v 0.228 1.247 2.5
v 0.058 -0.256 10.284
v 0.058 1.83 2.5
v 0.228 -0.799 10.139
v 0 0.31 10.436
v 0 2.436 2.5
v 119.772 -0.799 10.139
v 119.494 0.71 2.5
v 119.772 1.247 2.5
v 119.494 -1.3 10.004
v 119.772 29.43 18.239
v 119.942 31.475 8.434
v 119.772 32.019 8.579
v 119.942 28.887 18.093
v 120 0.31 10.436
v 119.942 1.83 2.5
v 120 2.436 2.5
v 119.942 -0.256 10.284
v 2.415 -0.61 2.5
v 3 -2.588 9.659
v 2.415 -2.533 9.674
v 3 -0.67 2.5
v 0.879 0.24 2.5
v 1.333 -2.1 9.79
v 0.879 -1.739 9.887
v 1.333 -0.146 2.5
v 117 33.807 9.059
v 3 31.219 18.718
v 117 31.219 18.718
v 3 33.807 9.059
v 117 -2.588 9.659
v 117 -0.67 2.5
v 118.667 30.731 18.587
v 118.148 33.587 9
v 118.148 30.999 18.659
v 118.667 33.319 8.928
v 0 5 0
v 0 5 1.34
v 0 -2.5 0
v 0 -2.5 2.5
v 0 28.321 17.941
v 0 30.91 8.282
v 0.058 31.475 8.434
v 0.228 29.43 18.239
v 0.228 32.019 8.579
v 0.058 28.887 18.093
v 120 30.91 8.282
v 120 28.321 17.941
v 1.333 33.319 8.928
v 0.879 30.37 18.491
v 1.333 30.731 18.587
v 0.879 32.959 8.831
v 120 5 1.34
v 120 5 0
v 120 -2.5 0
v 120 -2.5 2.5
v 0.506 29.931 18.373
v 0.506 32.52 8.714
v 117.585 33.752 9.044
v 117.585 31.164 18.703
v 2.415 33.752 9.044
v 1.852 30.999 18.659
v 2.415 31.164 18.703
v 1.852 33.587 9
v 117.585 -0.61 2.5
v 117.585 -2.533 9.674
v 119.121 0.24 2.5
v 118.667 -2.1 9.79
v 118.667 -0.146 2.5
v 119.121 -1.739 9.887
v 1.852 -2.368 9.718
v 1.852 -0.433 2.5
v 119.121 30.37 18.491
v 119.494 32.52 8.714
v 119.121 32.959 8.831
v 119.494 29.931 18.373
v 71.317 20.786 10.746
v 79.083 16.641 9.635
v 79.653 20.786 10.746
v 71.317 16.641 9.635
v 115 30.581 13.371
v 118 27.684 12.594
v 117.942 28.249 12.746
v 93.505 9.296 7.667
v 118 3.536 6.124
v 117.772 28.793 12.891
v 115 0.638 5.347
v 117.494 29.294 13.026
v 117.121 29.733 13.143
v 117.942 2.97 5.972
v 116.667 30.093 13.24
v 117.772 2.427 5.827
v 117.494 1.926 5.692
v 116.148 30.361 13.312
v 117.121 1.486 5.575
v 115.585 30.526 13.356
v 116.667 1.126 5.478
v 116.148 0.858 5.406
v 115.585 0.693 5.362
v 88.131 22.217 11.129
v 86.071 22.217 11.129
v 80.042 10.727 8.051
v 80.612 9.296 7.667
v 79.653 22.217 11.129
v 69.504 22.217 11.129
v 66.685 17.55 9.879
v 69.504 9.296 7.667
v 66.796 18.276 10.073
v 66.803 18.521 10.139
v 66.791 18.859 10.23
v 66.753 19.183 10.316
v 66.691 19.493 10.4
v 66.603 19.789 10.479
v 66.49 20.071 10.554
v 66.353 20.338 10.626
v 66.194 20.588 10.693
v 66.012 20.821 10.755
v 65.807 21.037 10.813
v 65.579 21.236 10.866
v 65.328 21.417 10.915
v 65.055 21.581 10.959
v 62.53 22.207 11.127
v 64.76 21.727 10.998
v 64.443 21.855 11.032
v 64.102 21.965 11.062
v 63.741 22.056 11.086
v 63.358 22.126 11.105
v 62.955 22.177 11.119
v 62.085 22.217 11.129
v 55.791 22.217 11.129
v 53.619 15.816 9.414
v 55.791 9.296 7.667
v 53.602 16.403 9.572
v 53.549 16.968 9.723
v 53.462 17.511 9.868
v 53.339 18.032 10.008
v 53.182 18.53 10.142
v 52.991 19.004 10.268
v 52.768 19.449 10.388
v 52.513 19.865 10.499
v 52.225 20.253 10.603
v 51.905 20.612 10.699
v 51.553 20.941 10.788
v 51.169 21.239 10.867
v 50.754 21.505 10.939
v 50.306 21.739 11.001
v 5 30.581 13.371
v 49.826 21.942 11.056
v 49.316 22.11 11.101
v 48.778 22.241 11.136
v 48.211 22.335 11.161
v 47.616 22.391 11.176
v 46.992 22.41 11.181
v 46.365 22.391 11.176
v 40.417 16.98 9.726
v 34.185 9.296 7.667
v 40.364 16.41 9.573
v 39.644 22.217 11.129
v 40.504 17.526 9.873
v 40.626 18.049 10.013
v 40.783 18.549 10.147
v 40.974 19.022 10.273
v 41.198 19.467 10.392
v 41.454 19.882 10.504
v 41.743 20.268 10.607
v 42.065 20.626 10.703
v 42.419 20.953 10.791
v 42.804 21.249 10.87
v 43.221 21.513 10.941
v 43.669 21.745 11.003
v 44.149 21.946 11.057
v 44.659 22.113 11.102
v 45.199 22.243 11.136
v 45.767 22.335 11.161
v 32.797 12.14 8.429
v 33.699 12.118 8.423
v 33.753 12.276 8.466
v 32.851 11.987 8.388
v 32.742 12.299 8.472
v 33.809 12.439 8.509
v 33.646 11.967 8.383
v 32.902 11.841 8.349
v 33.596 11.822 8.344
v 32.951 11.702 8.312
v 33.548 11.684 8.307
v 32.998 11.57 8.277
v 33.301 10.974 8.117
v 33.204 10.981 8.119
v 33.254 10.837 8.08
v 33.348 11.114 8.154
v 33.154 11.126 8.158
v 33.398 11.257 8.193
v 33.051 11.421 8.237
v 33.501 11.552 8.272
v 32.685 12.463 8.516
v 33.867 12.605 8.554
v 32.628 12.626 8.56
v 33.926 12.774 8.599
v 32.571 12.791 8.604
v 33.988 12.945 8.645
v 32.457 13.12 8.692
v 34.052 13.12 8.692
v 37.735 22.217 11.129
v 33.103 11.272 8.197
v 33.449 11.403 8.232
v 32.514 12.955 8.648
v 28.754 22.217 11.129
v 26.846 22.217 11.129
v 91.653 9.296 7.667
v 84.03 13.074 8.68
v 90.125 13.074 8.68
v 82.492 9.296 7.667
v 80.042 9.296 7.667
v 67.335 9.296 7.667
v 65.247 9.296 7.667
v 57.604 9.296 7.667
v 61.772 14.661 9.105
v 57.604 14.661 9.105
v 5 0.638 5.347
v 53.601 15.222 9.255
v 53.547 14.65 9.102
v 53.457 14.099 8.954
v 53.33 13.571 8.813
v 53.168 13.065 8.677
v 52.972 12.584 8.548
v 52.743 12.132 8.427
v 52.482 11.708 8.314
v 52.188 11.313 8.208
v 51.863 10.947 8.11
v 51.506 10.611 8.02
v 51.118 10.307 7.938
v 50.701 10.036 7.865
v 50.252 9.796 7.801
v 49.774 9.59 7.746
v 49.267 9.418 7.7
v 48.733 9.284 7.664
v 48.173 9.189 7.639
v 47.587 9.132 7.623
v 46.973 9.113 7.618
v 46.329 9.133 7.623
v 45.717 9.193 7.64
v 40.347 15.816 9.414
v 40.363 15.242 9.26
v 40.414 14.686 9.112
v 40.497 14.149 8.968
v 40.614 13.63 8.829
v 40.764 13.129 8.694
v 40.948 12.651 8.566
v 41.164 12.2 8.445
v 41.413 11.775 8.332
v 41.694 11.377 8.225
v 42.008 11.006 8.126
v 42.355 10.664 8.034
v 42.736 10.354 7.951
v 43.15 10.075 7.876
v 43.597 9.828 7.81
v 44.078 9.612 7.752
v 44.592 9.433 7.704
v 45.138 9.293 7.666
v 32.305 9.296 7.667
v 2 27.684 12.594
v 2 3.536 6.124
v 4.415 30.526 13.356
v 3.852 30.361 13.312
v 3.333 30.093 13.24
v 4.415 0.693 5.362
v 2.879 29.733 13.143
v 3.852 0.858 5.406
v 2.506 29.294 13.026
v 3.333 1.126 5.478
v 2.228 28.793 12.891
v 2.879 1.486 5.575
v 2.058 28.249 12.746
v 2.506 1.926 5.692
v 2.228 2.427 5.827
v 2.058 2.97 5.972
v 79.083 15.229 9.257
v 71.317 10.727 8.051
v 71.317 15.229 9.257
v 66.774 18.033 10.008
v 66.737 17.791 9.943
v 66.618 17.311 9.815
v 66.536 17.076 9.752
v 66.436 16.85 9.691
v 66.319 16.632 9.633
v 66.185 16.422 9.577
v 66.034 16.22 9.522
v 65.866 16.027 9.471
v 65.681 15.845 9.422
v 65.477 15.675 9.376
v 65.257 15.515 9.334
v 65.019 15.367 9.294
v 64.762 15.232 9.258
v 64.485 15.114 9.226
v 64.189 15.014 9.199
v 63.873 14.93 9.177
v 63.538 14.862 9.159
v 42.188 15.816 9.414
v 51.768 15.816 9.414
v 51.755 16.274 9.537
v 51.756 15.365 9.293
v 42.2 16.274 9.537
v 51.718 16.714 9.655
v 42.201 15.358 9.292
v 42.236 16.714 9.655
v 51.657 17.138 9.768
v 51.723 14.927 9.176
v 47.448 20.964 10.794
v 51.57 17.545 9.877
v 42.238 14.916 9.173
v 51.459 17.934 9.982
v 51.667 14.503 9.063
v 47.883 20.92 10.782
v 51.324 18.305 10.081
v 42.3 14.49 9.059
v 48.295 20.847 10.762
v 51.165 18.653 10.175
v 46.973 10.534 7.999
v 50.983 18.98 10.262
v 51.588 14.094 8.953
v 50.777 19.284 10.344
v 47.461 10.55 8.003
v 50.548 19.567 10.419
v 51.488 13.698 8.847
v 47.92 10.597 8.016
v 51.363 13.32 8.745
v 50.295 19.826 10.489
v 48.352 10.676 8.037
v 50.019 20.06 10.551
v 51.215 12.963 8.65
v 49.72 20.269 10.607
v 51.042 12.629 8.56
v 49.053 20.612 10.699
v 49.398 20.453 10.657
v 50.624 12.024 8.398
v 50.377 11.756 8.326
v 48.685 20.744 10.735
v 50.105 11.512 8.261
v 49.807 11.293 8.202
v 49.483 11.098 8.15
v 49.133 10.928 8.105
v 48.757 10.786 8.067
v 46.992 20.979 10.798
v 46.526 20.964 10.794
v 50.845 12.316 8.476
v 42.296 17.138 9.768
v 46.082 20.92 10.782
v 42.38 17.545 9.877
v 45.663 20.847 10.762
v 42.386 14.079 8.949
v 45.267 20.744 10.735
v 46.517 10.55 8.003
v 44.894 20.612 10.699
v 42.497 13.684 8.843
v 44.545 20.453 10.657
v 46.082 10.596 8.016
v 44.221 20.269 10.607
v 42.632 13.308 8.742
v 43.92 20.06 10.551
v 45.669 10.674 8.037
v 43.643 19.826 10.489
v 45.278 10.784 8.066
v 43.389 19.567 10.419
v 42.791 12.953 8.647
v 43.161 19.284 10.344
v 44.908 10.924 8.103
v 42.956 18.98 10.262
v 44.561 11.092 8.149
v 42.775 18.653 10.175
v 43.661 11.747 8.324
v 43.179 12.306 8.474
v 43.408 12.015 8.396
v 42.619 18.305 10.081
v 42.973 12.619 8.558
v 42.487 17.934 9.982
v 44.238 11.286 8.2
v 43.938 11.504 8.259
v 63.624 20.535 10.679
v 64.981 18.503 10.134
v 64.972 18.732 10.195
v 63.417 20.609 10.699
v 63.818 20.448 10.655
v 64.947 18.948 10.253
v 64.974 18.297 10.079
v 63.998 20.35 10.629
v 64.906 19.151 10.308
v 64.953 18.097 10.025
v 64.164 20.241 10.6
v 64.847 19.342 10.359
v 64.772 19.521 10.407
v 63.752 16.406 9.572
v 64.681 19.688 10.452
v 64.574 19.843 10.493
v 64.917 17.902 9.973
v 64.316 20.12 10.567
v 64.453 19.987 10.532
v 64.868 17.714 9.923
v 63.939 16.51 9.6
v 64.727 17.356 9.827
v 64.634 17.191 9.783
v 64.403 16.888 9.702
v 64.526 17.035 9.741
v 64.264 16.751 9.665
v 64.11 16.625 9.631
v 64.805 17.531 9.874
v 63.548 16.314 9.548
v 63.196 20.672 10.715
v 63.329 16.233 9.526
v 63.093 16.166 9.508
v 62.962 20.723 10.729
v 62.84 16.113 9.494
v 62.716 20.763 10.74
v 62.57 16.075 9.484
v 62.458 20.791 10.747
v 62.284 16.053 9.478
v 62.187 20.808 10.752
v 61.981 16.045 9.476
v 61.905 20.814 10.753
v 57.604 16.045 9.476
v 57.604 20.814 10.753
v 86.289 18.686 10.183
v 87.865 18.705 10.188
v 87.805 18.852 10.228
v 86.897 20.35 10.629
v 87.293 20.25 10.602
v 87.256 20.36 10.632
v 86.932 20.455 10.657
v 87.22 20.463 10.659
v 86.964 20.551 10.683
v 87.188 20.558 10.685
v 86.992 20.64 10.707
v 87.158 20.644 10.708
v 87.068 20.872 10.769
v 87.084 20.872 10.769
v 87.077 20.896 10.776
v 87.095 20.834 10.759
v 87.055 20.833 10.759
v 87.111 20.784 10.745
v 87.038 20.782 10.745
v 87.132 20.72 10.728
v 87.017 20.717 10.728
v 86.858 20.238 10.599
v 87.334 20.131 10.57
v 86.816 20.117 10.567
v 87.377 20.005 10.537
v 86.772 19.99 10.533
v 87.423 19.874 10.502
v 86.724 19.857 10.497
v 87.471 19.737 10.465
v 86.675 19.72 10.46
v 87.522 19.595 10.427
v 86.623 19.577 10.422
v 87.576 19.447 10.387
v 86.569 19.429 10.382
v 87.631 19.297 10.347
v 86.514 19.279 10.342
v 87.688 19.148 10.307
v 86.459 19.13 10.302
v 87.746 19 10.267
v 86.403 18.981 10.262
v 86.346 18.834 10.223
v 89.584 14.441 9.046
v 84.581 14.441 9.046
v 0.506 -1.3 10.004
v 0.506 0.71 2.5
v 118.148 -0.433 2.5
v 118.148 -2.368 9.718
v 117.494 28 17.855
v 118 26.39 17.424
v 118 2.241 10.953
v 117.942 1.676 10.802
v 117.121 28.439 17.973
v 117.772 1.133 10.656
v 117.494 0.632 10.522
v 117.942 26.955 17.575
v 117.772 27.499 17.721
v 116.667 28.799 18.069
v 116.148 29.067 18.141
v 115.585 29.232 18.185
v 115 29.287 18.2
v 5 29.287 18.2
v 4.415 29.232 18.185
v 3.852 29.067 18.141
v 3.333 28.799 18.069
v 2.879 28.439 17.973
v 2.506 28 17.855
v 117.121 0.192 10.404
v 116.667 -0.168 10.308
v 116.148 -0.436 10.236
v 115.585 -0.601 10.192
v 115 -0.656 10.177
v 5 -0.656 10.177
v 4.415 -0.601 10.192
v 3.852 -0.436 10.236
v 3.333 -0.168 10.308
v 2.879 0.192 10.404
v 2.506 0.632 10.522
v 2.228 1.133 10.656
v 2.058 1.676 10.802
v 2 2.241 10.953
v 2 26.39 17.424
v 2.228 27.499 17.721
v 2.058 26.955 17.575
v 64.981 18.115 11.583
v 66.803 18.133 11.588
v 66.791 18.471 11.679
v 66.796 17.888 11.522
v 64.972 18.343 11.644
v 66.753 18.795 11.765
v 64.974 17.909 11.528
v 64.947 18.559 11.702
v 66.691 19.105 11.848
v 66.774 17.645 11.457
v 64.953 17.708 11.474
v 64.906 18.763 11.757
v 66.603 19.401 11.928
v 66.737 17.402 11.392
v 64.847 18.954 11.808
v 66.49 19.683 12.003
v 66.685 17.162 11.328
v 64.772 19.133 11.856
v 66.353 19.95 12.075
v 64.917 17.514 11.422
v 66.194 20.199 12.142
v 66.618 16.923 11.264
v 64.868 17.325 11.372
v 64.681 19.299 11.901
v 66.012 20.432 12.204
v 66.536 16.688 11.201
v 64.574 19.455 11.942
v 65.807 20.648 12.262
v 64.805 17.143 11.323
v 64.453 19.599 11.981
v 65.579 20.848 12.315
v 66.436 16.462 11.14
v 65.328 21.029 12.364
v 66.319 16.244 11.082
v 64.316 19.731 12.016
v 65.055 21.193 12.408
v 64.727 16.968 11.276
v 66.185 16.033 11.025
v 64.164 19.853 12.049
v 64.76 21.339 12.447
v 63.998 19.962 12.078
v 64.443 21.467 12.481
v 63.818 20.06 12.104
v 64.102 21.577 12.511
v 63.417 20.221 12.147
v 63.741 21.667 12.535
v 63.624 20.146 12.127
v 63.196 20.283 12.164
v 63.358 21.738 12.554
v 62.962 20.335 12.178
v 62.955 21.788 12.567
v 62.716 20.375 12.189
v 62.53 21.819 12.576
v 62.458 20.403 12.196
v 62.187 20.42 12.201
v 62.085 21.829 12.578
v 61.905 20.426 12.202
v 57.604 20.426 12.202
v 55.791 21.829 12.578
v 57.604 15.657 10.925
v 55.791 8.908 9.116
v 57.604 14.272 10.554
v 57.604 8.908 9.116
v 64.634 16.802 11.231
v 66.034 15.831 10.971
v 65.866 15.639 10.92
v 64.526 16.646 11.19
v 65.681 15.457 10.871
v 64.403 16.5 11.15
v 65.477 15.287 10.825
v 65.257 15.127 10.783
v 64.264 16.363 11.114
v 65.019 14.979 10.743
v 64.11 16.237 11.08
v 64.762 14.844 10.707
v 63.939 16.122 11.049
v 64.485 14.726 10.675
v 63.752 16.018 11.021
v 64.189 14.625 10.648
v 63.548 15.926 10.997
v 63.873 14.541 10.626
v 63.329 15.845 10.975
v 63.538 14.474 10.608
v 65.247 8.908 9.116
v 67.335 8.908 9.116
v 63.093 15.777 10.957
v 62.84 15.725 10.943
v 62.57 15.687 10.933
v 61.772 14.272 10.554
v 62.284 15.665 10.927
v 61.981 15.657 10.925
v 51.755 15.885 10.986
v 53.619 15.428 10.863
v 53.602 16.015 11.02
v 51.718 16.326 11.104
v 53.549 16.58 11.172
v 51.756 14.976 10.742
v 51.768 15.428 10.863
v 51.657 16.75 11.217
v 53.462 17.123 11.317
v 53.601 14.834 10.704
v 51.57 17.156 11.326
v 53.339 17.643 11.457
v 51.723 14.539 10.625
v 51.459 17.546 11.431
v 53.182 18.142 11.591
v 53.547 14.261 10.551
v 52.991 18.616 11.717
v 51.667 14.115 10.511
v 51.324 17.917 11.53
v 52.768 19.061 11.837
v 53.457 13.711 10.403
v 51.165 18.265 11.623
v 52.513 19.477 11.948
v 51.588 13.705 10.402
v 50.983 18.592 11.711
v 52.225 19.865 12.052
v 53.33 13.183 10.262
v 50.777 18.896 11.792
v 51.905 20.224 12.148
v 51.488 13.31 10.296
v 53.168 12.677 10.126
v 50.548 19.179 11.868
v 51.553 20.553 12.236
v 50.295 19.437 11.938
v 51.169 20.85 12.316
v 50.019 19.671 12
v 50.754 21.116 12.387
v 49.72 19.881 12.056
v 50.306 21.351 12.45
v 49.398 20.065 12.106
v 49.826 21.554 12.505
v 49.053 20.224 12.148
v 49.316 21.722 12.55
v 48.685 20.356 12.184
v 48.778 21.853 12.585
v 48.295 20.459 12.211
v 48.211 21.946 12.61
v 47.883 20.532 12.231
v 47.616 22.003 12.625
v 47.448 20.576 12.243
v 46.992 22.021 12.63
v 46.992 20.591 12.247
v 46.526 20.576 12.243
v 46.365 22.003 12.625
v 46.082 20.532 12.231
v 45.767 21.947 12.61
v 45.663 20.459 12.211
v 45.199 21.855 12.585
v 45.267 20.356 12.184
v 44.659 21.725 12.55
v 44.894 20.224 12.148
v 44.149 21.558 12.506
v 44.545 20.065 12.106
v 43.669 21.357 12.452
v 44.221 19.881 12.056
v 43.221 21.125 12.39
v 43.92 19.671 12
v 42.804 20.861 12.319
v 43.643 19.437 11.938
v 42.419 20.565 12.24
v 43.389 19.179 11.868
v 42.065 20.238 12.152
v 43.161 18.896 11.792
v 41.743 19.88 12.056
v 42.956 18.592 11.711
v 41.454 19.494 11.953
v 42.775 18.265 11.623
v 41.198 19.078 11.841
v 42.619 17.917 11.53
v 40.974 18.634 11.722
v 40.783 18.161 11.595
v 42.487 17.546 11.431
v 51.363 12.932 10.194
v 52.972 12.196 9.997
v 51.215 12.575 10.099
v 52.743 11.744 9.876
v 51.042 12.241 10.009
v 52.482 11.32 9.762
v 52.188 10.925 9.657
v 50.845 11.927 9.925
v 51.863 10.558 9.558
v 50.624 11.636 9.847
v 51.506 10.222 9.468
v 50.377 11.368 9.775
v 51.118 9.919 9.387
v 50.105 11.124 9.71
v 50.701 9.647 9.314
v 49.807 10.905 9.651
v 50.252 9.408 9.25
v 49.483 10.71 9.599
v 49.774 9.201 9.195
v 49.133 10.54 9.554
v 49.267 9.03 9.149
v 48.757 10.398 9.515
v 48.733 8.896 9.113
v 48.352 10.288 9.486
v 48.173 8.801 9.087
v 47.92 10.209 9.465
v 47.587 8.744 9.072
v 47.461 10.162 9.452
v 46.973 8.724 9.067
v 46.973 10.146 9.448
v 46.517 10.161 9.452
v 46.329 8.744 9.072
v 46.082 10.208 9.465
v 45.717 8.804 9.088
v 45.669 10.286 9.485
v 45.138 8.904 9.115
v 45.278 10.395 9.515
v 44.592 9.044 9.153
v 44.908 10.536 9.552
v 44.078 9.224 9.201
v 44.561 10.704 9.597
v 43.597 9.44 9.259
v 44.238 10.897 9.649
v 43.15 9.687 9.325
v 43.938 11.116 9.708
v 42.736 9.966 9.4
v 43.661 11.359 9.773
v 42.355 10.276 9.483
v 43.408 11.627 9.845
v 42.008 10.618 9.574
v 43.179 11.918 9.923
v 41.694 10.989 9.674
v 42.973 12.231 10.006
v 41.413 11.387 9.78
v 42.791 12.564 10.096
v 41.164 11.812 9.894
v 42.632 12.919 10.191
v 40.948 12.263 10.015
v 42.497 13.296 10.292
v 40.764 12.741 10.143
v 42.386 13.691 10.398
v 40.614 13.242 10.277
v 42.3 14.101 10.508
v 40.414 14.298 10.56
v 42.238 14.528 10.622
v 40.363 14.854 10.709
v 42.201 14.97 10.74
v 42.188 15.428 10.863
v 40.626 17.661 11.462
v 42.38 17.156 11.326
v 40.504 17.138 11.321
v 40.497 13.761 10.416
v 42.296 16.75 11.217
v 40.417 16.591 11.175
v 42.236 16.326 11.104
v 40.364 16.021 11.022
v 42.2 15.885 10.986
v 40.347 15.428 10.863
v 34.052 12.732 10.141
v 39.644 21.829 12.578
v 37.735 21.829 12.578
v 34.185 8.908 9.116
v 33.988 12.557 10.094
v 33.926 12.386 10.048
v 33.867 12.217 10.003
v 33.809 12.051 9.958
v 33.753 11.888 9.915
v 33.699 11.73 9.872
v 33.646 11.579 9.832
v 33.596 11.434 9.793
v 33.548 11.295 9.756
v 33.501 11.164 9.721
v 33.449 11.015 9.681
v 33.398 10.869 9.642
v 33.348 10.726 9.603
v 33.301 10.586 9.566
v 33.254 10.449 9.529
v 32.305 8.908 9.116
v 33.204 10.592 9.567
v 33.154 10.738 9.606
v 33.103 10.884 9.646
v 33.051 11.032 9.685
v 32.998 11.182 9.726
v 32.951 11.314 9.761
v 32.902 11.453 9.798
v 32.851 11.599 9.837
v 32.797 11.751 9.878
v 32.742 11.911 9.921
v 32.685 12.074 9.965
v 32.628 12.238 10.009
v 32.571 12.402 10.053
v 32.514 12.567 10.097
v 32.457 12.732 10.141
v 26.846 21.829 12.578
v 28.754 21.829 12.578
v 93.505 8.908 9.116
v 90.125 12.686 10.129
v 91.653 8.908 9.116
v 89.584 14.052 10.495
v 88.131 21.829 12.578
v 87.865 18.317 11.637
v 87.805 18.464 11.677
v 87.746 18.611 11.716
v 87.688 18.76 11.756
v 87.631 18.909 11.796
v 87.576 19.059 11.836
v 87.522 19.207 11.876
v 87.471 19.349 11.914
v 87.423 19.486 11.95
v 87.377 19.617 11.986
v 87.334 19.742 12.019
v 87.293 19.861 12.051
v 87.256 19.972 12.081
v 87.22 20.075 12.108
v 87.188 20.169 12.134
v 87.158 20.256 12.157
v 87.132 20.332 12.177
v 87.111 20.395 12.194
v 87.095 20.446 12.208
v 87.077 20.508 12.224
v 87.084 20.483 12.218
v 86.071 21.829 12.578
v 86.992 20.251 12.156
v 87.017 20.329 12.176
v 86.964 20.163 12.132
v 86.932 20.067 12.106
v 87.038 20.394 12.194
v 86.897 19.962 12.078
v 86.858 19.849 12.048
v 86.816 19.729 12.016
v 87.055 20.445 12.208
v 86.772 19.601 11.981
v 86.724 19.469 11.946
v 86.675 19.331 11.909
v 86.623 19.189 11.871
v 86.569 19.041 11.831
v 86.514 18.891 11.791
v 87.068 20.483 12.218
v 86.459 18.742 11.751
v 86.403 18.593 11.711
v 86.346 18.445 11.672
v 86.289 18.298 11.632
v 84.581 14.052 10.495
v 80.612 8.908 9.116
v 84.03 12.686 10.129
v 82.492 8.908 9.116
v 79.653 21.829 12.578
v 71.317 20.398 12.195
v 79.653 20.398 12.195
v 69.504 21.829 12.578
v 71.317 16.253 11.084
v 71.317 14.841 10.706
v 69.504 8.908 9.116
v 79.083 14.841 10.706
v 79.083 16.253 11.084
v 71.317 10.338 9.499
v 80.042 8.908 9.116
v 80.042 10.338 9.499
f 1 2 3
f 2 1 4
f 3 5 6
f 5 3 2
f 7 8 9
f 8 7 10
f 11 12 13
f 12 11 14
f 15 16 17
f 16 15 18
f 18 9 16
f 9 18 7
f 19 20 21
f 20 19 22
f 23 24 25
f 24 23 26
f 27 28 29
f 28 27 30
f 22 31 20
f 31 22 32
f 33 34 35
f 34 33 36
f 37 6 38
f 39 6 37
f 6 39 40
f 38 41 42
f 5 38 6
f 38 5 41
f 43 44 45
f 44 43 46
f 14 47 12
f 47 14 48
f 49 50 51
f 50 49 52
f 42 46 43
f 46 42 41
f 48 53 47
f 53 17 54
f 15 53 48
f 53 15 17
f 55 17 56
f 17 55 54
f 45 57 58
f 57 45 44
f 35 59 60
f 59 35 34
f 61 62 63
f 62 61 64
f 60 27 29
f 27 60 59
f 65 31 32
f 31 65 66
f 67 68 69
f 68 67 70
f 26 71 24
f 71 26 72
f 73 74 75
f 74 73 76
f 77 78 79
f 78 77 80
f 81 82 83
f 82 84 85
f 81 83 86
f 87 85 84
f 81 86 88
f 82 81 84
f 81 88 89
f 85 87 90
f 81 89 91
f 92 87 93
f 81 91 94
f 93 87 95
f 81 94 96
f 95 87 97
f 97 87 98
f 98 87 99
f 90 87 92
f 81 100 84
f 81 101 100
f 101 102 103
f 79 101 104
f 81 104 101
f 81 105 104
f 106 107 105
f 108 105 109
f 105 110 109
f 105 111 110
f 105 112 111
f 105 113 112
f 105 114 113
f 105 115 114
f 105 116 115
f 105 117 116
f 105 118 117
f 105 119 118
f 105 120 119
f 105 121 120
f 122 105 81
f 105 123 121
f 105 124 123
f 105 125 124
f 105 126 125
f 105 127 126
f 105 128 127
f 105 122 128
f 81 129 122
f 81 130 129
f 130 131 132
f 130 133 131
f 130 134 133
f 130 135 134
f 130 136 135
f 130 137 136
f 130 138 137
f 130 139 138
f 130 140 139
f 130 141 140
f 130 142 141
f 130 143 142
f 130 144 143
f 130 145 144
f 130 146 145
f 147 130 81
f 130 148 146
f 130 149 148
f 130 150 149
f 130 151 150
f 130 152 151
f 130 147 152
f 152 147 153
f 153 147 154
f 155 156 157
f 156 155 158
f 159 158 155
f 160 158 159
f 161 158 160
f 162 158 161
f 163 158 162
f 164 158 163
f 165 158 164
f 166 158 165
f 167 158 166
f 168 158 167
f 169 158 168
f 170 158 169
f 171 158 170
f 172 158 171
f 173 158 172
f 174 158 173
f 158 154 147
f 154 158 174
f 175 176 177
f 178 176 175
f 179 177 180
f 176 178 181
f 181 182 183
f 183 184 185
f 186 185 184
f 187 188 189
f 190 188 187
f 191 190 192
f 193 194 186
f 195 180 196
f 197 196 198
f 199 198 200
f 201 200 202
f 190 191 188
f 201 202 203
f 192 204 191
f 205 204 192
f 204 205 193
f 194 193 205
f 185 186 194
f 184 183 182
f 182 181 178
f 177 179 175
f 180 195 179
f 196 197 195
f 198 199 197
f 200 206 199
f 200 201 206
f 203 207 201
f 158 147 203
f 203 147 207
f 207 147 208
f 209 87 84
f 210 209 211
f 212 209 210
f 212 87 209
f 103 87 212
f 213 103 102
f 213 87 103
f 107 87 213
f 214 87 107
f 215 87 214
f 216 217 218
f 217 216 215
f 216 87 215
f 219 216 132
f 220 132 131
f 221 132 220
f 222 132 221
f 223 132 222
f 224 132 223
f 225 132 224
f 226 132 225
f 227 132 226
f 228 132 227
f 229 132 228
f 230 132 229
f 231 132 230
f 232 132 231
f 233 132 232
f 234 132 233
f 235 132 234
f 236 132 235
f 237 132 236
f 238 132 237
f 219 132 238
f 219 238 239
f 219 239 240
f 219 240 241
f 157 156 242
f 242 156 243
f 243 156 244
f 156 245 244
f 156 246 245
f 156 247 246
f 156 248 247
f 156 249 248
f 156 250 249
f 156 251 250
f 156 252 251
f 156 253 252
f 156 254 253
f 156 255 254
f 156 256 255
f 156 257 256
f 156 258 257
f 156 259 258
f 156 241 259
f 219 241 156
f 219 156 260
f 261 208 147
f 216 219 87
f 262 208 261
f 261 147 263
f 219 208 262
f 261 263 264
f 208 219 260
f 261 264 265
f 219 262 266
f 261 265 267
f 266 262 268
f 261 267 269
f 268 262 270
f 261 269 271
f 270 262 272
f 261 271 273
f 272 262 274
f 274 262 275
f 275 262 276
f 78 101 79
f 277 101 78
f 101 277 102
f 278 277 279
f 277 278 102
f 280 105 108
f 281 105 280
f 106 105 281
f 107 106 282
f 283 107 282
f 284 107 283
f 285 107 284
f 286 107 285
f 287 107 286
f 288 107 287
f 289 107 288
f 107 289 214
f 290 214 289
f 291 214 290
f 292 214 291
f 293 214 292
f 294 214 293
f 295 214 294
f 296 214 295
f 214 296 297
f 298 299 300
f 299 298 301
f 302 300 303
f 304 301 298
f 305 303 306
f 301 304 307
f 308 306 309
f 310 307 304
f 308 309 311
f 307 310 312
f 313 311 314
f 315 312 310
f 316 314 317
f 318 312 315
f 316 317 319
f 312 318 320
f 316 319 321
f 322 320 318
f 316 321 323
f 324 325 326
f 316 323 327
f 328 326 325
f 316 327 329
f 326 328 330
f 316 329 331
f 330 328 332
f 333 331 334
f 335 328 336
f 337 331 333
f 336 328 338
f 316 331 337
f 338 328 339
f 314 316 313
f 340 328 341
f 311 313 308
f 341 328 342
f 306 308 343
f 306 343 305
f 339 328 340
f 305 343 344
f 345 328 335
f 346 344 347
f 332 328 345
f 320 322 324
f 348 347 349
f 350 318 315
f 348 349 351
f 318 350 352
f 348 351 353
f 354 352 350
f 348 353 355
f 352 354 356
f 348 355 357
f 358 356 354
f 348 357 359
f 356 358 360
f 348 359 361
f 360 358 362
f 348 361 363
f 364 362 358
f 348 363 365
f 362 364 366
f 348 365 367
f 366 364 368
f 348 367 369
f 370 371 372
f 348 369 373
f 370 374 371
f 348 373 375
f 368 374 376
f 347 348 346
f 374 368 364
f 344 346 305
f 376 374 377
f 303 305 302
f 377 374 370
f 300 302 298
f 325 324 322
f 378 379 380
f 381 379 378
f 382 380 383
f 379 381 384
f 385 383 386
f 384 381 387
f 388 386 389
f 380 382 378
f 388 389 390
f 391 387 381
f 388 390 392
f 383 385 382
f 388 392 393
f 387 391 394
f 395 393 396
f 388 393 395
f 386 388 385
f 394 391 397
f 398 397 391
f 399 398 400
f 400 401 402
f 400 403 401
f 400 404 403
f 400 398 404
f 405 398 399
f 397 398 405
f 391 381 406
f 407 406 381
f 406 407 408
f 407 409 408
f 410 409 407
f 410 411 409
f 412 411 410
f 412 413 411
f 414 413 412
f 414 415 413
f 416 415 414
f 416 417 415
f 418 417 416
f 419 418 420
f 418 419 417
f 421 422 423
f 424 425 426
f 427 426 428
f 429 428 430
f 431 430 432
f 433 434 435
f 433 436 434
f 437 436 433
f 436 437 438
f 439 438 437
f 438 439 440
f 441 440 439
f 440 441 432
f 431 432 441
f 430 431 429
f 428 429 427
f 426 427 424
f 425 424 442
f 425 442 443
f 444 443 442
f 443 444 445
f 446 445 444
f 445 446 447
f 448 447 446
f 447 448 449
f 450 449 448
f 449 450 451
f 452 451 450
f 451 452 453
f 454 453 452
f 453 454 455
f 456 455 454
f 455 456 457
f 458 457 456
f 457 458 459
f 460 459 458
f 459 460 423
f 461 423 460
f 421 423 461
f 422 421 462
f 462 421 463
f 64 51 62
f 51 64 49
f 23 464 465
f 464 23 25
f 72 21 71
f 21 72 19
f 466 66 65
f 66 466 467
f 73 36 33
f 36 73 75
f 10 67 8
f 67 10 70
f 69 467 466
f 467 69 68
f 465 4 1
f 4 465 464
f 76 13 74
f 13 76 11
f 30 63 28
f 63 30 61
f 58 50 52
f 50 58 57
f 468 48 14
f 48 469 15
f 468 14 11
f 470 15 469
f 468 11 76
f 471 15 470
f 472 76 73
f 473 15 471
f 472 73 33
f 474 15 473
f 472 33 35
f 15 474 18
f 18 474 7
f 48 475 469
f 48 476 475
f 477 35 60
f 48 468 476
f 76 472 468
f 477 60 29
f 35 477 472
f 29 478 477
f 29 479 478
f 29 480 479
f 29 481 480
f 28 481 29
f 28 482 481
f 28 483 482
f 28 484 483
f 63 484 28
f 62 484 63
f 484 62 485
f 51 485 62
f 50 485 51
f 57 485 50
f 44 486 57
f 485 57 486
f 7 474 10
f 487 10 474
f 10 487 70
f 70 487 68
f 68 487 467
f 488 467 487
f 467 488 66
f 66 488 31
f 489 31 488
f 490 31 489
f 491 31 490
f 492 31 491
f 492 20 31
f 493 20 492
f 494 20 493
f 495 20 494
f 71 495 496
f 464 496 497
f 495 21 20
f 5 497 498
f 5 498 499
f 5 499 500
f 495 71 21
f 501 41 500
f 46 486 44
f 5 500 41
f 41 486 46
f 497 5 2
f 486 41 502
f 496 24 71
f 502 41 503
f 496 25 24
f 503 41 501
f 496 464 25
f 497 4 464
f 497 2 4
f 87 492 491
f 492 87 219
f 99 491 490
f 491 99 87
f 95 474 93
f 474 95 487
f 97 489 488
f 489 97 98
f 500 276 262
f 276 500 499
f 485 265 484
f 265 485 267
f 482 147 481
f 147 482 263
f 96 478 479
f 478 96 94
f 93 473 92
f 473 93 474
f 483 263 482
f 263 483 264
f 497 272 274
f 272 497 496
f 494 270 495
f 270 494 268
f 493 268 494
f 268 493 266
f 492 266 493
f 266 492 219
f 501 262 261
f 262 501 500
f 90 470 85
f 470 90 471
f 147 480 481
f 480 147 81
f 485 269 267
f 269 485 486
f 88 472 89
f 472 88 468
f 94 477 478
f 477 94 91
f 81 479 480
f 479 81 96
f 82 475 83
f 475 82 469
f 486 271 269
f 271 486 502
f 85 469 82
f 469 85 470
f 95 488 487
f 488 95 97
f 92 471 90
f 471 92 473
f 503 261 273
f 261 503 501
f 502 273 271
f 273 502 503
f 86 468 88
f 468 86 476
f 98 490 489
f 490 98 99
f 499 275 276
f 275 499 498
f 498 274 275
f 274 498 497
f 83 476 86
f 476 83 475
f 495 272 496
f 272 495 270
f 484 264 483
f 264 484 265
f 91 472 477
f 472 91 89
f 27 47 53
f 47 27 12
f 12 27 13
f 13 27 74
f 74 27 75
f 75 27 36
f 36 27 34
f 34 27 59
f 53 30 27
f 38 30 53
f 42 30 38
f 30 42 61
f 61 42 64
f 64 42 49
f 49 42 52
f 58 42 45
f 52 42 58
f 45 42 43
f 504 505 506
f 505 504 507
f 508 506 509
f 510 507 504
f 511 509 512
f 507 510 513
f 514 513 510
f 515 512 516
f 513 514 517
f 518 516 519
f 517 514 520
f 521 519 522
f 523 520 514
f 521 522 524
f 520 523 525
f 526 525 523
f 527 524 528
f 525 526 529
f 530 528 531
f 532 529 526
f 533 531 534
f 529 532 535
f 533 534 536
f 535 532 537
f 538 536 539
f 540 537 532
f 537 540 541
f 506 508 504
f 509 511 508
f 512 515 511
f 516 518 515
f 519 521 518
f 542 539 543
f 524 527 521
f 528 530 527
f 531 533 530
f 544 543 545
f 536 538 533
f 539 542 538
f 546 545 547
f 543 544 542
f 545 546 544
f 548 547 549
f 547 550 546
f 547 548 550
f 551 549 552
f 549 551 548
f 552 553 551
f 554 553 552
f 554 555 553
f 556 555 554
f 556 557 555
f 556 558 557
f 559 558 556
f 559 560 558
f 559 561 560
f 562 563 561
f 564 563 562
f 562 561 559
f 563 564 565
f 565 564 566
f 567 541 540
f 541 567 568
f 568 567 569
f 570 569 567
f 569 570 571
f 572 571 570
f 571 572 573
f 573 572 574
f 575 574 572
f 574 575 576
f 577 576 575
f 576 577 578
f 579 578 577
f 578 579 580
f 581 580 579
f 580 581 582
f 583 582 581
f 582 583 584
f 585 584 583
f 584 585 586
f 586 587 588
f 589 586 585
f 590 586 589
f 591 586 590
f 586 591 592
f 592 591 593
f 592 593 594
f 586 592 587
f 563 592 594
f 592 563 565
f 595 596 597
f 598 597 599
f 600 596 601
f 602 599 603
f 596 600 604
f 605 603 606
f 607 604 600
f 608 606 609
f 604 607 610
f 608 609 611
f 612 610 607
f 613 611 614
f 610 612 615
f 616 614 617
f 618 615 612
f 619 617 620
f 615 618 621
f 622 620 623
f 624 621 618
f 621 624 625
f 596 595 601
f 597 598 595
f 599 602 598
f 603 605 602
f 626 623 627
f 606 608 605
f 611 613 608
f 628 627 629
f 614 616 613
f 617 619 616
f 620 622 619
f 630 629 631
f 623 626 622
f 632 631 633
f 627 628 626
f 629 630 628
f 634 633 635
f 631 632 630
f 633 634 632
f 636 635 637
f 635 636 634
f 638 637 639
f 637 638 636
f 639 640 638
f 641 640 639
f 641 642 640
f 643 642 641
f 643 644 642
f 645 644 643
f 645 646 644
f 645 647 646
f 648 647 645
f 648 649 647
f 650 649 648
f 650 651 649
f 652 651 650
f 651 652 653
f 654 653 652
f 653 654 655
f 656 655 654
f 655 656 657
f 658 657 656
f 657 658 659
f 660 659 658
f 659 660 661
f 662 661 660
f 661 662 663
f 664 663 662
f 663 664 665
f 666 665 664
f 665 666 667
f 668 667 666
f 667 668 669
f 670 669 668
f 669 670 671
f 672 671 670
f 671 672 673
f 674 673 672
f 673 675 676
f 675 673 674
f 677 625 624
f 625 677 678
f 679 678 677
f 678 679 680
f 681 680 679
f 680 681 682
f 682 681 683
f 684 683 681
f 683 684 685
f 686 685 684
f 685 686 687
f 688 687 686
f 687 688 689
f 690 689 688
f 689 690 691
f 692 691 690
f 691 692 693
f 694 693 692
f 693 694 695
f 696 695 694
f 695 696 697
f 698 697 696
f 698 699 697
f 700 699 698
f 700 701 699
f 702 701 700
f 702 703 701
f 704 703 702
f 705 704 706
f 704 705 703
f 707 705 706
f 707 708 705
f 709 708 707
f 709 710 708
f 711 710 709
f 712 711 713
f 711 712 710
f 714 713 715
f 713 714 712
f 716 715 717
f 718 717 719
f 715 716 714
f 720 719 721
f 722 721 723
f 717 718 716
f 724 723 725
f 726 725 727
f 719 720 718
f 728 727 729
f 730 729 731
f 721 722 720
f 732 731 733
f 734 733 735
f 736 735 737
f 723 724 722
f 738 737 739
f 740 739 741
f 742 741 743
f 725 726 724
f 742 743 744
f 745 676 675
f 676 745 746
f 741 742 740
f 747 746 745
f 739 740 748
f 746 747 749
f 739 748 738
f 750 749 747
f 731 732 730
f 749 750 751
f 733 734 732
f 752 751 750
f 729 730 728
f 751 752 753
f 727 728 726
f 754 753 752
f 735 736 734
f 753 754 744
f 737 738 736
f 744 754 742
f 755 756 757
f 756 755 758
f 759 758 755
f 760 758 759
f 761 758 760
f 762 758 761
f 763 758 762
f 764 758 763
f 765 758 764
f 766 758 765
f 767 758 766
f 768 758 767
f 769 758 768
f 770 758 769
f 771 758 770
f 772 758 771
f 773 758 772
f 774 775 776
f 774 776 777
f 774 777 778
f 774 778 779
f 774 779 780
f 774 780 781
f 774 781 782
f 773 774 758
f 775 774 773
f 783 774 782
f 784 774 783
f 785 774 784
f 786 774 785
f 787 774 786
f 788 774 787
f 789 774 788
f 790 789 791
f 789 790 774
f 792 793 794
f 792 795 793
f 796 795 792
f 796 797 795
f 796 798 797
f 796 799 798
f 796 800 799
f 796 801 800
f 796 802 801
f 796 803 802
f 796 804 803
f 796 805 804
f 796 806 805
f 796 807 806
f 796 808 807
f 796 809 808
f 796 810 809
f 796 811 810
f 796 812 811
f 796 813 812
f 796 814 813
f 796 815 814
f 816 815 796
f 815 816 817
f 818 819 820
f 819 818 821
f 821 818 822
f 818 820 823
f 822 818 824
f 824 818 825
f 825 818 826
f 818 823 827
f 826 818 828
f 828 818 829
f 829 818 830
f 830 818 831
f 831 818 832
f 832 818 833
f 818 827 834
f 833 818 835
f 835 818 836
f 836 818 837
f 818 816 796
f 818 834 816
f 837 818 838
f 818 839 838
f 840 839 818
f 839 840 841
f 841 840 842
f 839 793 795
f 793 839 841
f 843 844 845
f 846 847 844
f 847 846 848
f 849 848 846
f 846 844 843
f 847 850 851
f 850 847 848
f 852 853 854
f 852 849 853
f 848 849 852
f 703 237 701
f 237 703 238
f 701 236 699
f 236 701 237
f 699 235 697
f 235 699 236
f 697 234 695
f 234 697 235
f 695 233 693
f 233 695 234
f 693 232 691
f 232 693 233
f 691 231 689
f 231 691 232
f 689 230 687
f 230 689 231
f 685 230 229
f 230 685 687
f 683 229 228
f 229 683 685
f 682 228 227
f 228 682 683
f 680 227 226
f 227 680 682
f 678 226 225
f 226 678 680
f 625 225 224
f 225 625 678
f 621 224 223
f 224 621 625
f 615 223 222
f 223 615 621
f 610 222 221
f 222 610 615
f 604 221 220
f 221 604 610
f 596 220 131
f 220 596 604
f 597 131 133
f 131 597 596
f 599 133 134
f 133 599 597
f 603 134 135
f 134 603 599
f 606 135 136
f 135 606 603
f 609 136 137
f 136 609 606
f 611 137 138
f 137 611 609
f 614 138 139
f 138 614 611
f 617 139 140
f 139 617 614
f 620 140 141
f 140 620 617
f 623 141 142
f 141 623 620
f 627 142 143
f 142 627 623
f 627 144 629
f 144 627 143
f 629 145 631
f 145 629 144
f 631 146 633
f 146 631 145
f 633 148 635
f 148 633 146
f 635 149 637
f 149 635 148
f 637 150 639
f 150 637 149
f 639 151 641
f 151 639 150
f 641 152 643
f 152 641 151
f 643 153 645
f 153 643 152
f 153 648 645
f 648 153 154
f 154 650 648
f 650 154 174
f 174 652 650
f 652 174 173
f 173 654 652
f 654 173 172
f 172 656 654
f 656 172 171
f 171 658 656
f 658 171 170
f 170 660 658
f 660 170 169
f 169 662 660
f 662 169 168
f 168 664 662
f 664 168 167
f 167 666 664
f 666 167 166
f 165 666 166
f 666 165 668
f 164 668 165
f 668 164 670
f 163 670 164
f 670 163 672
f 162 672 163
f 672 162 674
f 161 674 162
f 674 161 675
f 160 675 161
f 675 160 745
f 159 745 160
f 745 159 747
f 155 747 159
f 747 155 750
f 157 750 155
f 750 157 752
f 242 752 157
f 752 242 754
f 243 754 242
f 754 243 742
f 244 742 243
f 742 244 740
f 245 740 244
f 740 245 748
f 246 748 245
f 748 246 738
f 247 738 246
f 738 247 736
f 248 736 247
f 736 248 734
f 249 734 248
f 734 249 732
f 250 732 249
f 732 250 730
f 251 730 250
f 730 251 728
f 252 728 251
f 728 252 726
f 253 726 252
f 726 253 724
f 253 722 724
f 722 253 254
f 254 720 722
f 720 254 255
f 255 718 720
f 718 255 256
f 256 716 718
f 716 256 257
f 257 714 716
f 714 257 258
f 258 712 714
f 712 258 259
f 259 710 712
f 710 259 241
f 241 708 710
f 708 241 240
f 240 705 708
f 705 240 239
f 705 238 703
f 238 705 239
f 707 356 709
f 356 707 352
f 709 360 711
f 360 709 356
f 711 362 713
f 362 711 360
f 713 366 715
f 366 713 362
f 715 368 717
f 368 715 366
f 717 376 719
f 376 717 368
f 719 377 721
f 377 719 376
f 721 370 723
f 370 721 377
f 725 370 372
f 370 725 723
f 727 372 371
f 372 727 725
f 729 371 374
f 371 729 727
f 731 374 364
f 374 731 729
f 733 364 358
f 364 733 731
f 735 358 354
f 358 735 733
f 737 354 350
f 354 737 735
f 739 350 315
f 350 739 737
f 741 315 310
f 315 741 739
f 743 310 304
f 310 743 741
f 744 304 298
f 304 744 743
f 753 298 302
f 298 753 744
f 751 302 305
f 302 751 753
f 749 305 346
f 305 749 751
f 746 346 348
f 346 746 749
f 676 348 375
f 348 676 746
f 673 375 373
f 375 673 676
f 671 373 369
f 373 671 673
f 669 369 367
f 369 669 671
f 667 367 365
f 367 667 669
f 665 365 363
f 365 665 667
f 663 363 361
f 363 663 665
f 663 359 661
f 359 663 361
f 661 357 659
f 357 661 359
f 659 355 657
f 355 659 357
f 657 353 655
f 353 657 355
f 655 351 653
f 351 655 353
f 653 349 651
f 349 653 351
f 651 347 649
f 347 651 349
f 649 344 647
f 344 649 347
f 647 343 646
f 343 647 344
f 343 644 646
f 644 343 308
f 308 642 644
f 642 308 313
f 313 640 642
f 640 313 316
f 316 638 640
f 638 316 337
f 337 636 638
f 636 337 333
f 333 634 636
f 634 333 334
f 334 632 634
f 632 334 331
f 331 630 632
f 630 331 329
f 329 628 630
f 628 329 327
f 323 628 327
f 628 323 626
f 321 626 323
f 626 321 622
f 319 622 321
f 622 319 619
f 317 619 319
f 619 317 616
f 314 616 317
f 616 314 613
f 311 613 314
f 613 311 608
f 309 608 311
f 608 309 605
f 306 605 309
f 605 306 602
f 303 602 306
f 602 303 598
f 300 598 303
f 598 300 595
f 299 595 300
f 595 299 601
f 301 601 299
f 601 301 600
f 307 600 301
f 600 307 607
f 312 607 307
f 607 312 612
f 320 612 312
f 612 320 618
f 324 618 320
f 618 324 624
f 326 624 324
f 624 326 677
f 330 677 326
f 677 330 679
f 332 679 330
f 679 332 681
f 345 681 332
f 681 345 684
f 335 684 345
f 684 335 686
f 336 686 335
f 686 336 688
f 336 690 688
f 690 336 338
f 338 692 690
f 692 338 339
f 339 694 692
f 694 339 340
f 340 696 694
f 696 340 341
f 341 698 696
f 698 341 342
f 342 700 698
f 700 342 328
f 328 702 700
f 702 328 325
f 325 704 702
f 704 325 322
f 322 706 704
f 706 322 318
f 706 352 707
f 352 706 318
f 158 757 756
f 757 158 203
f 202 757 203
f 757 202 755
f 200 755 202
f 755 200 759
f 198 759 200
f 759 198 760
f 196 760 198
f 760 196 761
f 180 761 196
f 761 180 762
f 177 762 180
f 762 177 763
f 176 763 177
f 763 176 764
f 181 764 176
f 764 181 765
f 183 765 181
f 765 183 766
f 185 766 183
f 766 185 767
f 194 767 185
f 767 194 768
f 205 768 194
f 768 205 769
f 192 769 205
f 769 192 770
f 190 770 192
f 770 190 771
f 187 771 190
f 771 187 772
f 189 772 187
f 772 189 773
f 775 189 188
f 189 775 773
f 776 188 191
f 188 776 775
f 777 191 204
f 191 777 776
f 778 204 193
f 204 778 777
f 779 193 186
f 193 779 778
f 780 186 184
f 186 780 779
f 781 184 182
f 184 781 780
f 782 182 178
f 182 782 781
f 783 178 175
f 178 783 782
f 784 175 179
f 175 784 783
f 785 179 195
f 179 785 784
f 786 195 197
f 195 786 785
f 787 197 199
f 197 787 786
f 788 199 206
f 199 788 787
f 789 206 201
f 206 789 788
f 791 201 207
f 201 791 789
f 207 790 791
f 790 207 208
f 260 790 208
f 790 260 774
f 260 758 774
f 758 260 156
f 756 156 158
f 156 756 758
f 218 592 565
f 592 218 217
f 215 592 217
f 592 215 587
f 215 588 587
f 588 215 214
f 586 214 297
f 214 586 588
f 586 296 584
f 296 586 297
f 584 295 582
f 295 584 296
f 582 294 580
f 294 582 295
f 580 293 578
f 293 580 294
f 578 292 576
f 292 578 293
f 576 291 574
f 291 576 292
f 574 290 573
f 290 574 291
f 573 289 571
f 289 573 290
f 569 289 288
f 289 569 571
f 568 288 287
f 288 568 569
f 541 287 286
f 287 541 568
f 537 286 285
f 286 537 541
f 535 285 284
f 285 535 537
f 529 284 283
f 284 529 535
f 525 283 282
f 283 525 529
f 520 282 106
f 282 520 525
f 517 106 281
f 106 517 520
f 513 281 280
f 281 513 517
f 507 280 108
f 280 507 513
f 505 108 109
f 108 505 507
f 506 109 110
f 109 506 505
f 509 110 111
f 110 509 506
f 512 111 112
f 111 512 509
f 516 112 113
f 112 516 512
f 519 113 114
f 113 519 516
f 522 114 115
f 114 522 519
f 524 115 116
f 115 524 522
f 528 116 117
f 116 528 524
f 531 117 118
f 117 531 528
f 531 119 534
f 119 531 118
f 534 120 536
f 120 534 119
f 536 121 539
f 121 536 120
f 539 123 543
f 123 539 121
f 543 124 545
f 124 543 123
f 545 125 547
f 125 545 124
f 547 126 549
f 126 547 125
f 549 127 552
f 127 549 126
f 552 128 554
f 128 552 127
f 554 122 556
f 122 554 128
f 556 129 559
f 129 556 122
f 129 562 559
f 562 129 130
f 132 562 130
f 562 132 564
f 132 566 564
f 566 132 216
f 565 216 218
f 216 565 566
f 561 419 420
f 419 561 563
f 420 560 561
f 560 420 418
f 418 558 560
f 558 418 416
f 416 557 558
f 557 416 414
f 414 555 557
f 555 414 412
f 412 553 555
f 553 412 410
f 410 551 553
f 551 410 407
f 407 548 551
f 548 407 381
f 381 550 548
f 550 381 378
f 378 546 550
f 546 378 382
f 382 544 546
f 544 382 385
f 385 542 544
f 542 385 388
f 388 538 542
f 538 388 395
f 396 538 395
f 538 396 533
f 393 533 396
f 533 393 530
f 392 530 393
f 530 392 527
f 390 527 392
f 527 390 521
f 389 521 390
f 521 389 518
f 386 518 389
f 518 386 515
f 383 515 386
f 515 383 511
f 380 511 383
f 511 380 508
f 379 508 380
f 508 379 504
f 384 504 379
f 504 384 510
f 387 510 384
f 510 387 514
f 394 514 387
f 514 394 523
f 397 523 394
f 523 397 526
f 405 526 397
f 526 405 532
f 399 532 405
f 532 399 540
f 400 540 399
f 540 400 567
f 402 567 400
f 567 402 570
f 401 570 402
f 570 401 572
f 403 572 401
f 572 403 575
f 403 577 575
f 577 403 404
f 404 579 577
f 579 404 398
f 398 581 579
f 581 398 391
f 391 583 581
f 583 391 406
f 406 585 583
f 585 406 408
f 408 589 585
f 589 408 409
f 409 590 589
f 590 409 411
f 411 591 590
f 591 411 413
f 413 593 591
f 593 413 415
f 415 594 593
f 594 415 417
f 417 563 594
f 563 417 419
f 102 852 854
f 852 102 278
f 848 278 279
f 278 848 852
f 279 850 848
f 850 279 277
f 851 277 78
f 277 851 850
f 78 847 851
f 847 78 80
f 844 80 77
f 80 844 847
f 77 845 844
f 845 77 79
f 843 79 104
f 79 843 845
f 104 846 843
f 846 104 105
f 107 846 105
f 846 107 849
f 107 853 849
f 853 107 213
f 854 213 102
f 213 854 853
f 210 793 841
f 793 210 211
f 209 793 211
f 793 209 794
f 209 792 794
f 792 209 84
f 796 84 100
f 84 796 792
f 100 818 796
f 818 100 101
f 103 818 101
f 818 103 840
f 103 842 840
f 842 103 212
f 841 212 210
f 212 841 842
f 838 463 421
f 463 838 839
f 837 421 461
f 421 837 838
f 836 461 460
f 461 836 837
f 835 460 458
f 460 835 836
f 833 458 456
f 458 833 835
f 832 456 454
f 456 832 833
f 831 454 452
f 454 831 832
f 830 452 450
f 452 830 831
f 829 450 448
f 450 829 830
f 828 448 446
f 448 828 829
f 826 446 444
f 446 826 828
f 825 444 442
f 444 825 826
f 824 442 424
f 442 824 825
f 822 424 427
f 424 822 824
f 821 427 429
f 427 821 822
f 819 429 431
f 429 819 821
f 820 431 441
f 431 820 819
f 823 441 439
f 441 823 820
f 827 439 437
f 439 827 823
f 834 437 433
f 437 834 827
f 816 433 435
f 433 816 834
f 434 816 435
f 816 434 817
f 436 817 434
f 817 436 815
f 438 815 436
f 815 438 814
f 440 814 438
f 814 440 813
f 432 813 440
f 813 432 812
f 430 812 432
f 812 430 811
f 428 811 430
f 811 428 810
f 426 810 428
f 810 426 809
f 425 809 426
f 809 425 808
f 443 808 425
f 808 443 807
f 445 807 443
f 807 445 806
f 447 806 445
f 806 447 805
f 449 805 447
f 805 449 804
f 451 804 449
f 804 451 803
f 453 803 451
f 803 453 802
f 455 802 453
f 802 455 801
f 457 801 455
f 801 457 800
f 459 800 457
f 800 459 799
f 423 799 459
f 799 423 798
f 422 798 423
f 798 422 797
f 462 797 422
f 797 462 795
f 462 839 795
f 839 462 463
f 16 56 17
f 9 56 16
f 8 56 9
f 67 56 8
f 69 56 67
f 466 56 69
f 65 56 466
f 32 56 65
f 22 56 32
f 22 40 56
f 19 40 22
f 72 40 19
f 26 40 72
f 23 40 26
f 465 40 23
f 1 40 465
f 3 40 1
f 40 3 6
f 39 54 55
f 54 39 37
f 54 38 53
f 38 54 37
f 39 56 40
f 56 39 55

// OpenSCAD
// Vorea Studio — Parametric Desk Nameplate
// Customizable nameplate with embossed text and decorative border
// Compatible: Vorea Studio SCAD Engine

// [Section: Text]
name_text = "VOREA";       // Text to display
font_size = 14;            // [8:1:30] Tamano de fuente (mm)
text_depth = 1.5;          // [0.5:0.5:4] Profundidad del texto (mm)

// [Section: Plate]
plate_width = 120;   // [60:5:200] Ancho de la placa (mm)
plate_height = 35;   // [20:5:60] Alto de la placa (mm)
plate_depth = 5;     // [3:1:10] Grosor de la placa (mm)
corner_r = 3;        // [0:1:10] Radio de esquinas

// [Section: Style]
border = 1;          // [0:1:1] Borde decorativo (0=no, 1=si)
border_width = 2;    // [1:0.5:5] Ancho del borde
base_stand = 1;      // [0:1:1] Base de apoyo (0=no, 1=si)
stand_angle = 75;    // [60:5:90] Angulo de inclinacion

$fn = 32;

// Rounded plate
module plate() {
  hull() {
    translate([corner_r, corner_r, 0]) cylinder(r=corner_r, h=plate_depth);
    translate([plate_width-corner_r, corner_r, 0]) cylinder(r=corner_r, h=plate_depth);
    translate([corner_r, plate_height-corner_r, 0]) cylinder(r=corner_r, h=plate_depth);
    translate([plate_width-corner_r, plate_height-corner_r, 0]) cylinder(r=corner_r, h=plate_depth);
  }
}

// Main assembly
rotate([90 - stand_angle, 0, 0]) {
  // Base plate
  plate();
  
  // Embossed text
  translate([plate_width/2, plate_height/2, plate_depth])
    linear_extrude(height = text_depth)
      text(name_text, size = font_size, halign = "center", valign = "center");
  
  // Decorative border
  if (border == 1) {
    difference() {
      translate([0, 0, plate_depth])
        plate();
      translate([border_width, border_width, plate_depth - 0.1])
        hull() {
          translate([corner_r, corner_r, 0]) cylinder(r=corner_r, h=plate_depth + 0.2);
          translate([plate_width-corner_r-border_width*2, corner_r, 0]) cylinder(r=corner_r, h=plate_depth + 0.2);
          translate([corner_r, plate_height-corner_r-border_width*2, 0]) cylinder(r=corner_r, h=plate_depth + 0.2);
          translate([plate_width-corner_r-border_width*2, plate_height-corner_r-border_width*2, 0]) cylinder(r=corner_r, h=plate_depth + 0.2);
        }
    }
  }
}

// Stand base
if (base_stand == 1) {
  translate([0, -plate_depth * 0.5, 0])
    cube([plate_width, plate_depth * 1.5, plate_depth/2]);
}
